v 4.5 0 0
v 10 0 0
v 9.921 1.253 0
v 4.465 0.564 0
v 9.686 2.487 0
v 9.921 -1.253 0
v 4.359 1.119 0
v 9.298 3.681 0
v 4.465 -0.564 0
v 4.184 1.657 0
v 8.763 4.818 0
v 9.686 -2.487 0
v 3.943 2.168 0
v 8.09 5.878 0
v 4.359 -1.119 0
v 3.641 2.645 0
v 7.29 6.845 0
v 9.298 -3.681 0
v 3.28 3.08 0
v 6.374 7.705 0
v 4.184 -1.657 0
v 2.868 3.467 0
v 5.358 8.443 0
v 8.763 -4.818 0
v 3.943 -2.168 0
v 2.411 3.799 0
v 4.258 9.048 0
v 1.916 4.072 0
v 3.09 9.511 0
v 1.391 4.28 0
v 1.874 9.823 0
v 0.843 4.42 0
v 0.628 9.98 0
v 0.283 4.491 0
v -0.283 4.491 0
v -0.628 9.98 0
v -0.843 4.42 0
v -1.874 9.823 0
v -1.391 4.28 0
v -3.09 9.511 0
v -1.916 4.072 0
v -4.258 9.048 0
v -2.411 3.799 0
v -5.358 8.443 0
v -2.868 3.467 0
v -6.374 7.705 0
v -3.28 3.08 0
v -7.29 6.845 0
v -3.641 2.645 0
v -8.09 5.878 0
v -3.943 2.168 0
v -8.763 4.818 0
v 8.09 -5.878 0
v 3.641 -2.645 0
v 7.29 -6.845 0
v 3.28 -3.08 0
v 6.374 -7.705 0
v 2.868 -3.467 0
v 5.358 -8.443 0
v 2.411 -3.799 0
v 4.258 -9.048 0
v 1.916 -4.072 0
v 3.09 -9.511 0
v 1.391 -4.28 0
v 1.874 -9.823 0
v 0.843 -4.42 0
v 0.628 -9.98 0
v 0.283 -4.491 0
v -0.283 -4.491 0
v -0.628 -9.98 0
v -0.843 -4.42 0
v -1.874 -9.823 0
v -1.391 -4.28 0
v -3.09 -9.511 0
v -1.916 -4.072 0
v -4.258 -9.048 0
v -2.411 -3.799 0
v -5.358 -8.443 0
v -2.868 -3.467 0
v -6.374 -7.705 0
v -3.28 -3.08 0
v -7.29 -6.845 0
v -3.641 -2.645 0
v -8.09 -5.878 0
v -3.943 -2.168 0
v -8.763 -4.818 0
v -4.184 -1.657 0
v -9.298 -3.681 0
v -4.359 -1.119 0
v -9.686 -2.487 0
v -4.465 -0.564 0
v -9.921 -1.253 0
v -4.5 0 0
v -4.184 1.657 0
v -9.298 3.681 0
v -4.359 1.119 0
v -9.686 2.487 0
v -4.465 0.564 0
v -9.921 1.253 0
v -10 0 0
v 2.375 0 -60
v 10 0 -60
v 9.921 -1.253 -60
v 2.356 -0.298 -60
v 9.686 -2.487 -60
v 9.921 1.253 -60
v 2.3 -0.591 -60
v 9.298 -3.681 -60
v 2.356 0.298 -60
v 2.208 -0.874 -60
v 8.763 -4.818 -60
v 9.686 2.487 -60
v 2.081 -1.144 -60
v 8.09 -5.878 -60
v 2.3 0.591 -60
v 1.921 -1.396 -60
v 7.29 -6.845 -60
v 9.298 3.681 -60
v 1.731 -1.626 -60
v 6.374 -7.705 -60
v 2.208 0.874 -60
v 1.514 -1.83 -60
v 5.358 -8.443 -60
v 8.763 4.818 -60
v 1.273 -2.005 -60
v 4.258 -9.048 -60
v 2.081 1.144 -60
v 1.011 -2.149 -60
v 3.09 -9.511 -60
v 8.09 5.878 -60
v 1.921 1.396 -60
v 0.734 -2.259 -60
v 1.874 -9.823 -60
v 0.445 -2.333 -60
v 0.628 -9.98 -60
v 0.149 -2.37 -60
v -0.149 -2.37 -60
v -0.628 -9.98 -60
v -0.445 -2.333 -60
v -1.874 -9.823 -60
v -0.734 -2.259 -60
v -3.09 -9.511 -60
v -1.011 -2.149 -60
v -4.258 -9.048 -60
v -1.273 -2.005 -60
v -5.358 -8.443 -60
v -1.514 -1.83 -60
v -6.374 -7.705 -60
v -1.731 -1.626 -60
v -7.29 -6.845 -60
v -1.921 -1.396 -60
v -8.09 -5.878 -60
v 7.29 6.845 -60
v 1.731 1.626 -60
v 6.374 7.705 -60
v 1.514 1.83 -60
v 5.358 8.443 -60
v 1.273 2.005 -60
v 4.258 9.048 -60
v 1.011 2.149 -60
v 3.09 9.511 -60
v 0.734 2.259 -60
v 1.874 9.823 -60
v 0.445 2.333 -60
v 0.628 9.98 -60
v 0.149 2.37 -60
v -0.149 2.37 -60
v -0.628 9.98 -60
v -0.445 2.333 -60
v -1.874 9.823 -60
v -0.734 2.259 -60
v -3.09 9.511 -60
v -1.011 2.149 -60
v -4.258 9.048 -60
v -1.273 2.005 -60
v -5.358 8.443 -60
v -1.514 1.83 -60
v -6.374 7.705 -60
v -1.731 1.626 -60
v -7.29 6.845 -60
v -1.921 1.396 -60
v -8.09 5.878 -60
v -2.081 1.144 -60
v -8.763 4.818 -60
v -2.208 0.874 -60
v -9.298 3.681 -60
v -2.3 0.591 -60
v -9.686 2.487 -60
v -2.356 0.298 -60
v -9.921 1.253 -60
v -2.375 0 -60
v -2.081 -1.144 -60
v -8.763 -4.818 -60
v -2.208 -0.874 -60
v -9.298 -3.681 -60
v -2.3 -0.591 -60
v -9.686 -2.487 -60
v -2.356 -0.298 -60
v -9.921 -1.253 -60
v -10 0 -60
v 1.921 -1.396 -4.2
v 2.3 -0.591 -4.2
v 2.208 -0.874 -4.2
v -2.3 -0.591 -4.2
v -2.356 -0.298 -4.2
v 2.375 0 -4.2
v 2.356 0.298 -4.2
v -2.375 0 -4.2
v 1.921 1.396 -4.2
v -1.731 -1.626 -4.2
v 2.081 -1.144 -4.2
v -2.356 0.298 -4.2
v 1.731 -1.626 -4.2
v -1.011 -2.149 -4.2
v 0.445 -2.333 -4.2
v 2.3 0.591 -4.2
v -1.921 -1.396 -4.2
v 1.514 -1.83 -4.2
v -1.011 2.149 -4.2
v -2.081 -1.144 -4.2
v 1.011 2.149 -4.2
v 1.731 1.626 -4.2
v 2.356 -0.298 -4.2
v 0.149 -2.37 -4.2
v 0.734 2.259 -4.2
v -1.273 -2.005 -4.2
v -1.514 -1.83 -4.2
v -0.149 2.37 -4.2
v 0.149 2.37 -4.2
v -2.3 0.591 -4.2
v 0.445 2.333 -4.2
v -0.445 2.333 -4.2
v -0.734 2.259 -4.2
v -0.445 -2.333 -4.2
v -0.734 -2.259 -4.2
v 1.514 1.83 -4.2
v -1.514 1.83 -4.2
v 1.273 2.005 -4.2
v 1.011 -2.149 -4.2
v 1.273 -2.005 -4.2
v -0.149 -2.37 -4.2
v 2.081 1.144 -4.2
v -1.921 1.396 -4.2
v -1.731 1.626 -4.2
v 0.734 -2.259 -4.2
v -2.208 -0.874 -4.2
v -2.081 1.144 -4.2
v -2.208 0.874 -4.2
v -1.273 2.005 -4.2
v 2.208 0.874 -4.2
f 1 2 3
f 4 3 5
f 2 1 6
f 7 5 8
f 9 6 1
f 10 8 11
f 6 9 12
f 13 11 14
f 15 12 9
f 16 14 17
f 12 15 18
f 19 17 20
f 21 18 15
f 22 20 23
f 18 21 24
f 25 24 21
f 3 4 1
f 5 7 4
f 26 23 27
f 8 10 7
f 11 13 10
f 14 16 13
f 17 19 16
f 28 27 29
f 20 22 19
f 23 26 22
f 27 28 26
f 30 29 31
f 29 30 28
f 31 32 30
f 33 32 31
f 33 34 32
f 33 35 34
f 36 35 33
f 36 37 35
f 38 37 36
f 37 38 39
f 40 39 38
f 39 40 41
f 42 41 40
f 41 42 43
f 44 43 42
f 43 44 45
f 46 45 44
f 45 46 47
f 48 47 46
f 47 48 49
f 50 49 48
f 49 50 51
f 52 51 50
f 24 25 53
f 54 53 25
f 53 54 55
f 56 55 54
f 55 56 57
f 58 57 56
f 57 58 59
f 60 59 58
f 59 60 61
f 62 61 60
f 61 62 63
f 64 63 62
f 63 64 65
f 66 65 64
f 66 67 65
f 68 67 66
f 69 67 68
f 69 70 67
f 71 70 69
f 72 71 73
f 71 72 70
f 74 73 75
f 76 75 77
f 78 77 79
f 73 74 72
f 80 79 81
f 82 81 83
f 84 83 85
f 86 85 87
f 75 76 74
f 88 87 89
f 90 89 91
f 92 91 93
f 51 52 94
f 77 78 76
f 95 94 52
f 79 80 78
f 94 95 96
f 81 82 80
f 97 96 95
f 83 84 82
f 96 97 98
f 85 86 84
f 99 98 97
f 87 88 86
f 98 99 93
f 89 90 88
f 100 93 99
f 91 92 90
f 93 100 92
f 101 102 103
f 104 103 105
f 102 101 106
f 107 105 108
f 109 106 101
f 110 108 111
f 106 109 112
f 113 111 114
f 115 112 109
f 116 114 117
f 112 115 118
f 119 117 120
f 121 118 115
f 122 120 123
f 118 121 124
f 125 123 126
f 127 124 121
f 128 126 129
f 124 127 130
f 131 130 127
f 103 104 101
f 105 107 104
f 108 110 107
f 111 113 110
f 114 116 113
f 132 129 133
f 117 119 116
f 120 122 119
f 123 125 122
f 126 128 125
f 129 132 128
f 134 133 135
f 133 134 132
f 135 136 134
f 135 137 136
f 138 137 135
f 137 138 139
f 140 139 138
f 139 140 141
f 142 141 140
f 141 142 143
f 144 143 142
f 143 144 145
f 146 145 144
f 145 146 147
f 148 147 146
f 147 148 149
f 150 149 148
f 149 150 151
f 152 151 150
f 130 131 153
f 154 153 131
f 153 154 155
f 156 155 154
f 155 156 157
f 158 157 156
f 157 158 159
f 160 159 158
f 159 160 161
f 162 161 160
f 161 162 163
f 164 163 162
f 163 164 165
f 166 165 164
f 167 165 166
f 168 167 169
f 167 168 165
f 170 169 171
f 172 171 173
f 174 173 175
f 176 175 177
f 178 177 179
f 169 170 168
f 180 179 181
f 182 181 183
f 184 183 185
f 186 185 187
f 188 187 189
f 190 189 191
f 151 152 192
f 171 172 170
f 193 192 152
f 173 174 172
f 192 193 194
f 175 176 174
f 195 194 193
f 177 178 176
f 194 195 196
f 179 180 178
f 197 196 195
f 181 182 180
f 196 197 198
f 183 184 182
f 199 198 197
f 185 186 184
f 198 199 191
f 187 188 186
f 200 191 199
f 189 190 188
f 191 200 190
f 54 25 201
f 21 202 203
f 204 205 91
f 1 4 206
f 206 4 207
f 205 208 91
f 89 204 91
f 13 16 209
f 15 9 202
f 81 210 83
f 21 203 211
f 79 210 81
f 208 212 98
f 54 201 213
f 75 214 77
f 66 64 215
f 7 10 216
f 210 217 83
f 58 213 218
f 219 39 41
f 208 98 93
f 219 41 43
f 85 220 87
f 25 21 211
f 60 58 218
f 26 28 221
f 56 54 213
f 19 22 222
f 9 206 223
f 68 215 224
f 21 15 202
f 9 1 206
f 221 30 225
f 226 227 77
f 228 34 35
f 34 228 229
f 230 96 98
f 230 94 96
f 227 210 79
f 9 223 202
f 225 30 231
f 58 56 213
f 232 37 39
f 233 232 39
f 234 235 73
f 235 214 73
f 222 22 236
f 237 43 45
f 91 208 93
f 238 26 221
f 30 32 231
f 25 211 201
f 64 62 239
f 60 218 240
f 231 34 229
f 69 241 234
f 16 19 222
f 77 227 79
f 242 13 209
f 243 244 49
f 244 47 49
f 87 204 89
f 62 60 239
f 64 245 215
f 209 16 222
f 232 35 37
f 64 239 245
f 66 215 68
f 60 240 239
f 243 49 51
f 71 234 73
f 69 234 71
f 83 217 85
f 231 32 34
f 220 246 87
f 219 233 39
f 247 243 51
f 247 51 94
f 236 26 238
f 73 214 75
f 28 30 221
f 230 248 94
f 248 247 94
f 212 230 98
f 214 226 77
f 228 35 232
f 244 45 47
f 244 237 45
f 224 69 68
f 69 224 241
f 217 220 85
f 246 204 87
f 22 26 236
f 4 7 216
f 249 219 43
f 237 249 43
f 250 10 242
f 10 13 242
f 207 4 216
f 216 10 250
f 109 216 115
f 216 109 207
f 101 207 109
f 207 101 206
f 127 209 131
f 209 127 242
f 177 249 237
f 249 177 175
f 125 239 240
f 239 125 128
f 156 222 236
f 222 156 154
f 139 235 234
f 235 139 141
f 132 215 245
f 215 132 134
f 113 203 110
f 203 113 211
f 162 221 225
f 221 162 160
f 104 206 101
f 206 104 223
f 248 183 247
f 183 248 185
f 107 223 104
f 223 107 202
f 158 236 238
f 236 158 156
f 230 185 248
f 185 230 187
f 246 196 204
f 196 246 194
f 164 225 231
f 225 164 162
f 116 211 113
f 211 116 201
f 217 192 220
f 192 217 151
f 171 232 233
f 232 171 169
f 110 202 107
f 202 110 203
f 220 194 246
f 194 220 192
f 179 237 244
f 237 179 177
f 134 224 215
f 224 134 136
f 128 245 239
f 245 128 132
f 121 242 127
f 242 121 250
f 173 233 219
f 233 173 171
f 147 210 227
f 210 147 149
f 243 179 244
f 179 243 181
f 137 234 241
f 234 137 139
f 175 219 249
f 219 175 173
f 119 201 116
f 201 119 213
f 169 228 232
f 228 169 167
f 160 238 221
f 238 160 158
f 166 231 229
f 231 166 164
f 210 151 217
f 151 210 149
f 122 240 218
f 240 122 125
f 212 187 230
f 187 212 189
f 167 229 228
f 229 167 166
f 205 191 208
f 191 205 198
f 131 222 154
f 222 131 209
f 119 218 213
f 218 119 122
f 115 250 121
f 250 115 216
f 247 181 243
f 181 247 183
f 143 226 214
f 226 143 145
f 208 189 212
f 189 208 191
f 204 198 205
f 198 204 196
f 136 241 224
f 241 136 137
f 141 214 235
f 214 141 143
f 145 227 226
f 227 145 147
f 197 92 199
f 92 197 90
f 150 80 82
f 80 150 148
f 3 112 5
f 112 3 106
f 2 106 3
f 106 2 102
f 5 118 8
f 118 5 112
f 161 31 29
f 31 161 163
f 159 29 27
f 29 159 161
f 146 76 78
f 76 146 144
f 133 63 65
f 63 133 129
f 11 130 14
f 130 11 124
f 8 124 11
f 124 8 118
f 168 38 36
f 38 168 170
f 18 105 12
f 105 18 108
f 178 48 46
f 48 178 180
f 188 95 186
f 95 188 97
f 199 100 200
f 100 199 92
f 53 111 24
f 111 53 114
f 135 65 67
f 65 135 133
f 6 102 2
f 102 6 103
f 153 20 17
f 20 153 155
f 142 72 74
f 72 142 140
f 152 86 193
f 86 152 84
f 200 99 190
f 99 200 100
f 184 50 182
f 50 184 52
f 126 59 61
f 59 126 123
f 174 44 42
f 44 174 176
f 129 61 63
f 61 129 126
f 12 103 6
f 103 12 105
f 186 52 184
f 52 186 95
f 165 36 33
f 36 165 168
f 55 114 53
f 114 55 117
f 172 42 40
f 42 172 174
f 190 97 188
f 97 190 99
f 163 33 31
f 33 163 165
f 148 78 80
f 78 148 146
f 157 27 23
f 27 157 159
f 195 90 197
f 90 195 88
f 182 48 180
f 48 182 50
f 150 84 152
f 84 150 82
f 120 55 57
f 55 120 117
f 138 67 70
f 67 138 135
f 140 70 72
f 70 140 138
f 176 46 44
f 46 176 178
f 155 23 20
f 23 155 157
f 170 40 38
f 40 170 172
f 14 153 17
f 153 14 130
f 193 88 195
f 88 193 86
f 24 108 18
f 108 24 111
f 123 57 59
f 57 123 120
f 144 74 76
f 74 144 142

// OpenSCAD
$fn = 50;


difference() {
	union() {
		translate(v = [0, 0, -60.0000000000]) {
			cylinder(h = 60, r = 10.0000000000);
		}
		cylinder(h = 0, r = 16.0000000000);
	}
	union() {
		translate(v = [0, 0, 0]) {
			rotate(a = [0, 0, 0]) {
				difference() {
					union() {
						#translate(v = [0, 0, -60.0000000000]) {
							cylinder(h = 60, r = 2.2500000000);
						}
						#translate(v = [0, 0, -4.2000000000]) {
							cylinder(h = 4.2000000000, r = 10.0000000000, r1 = 2.3750000000, r2 = 4.5000000000);
						}
						#translate(v = [0, 0, -60.0000000000]) {
							cylinder(h = 60, r = 2.3750000000);
						}
						#translate(v = [0, 0, -60.0000000000]) {
							cylinder(h = 60, r = 2.2500000000);
						}
					}
					union();
				}
			}
		}
	}
}
